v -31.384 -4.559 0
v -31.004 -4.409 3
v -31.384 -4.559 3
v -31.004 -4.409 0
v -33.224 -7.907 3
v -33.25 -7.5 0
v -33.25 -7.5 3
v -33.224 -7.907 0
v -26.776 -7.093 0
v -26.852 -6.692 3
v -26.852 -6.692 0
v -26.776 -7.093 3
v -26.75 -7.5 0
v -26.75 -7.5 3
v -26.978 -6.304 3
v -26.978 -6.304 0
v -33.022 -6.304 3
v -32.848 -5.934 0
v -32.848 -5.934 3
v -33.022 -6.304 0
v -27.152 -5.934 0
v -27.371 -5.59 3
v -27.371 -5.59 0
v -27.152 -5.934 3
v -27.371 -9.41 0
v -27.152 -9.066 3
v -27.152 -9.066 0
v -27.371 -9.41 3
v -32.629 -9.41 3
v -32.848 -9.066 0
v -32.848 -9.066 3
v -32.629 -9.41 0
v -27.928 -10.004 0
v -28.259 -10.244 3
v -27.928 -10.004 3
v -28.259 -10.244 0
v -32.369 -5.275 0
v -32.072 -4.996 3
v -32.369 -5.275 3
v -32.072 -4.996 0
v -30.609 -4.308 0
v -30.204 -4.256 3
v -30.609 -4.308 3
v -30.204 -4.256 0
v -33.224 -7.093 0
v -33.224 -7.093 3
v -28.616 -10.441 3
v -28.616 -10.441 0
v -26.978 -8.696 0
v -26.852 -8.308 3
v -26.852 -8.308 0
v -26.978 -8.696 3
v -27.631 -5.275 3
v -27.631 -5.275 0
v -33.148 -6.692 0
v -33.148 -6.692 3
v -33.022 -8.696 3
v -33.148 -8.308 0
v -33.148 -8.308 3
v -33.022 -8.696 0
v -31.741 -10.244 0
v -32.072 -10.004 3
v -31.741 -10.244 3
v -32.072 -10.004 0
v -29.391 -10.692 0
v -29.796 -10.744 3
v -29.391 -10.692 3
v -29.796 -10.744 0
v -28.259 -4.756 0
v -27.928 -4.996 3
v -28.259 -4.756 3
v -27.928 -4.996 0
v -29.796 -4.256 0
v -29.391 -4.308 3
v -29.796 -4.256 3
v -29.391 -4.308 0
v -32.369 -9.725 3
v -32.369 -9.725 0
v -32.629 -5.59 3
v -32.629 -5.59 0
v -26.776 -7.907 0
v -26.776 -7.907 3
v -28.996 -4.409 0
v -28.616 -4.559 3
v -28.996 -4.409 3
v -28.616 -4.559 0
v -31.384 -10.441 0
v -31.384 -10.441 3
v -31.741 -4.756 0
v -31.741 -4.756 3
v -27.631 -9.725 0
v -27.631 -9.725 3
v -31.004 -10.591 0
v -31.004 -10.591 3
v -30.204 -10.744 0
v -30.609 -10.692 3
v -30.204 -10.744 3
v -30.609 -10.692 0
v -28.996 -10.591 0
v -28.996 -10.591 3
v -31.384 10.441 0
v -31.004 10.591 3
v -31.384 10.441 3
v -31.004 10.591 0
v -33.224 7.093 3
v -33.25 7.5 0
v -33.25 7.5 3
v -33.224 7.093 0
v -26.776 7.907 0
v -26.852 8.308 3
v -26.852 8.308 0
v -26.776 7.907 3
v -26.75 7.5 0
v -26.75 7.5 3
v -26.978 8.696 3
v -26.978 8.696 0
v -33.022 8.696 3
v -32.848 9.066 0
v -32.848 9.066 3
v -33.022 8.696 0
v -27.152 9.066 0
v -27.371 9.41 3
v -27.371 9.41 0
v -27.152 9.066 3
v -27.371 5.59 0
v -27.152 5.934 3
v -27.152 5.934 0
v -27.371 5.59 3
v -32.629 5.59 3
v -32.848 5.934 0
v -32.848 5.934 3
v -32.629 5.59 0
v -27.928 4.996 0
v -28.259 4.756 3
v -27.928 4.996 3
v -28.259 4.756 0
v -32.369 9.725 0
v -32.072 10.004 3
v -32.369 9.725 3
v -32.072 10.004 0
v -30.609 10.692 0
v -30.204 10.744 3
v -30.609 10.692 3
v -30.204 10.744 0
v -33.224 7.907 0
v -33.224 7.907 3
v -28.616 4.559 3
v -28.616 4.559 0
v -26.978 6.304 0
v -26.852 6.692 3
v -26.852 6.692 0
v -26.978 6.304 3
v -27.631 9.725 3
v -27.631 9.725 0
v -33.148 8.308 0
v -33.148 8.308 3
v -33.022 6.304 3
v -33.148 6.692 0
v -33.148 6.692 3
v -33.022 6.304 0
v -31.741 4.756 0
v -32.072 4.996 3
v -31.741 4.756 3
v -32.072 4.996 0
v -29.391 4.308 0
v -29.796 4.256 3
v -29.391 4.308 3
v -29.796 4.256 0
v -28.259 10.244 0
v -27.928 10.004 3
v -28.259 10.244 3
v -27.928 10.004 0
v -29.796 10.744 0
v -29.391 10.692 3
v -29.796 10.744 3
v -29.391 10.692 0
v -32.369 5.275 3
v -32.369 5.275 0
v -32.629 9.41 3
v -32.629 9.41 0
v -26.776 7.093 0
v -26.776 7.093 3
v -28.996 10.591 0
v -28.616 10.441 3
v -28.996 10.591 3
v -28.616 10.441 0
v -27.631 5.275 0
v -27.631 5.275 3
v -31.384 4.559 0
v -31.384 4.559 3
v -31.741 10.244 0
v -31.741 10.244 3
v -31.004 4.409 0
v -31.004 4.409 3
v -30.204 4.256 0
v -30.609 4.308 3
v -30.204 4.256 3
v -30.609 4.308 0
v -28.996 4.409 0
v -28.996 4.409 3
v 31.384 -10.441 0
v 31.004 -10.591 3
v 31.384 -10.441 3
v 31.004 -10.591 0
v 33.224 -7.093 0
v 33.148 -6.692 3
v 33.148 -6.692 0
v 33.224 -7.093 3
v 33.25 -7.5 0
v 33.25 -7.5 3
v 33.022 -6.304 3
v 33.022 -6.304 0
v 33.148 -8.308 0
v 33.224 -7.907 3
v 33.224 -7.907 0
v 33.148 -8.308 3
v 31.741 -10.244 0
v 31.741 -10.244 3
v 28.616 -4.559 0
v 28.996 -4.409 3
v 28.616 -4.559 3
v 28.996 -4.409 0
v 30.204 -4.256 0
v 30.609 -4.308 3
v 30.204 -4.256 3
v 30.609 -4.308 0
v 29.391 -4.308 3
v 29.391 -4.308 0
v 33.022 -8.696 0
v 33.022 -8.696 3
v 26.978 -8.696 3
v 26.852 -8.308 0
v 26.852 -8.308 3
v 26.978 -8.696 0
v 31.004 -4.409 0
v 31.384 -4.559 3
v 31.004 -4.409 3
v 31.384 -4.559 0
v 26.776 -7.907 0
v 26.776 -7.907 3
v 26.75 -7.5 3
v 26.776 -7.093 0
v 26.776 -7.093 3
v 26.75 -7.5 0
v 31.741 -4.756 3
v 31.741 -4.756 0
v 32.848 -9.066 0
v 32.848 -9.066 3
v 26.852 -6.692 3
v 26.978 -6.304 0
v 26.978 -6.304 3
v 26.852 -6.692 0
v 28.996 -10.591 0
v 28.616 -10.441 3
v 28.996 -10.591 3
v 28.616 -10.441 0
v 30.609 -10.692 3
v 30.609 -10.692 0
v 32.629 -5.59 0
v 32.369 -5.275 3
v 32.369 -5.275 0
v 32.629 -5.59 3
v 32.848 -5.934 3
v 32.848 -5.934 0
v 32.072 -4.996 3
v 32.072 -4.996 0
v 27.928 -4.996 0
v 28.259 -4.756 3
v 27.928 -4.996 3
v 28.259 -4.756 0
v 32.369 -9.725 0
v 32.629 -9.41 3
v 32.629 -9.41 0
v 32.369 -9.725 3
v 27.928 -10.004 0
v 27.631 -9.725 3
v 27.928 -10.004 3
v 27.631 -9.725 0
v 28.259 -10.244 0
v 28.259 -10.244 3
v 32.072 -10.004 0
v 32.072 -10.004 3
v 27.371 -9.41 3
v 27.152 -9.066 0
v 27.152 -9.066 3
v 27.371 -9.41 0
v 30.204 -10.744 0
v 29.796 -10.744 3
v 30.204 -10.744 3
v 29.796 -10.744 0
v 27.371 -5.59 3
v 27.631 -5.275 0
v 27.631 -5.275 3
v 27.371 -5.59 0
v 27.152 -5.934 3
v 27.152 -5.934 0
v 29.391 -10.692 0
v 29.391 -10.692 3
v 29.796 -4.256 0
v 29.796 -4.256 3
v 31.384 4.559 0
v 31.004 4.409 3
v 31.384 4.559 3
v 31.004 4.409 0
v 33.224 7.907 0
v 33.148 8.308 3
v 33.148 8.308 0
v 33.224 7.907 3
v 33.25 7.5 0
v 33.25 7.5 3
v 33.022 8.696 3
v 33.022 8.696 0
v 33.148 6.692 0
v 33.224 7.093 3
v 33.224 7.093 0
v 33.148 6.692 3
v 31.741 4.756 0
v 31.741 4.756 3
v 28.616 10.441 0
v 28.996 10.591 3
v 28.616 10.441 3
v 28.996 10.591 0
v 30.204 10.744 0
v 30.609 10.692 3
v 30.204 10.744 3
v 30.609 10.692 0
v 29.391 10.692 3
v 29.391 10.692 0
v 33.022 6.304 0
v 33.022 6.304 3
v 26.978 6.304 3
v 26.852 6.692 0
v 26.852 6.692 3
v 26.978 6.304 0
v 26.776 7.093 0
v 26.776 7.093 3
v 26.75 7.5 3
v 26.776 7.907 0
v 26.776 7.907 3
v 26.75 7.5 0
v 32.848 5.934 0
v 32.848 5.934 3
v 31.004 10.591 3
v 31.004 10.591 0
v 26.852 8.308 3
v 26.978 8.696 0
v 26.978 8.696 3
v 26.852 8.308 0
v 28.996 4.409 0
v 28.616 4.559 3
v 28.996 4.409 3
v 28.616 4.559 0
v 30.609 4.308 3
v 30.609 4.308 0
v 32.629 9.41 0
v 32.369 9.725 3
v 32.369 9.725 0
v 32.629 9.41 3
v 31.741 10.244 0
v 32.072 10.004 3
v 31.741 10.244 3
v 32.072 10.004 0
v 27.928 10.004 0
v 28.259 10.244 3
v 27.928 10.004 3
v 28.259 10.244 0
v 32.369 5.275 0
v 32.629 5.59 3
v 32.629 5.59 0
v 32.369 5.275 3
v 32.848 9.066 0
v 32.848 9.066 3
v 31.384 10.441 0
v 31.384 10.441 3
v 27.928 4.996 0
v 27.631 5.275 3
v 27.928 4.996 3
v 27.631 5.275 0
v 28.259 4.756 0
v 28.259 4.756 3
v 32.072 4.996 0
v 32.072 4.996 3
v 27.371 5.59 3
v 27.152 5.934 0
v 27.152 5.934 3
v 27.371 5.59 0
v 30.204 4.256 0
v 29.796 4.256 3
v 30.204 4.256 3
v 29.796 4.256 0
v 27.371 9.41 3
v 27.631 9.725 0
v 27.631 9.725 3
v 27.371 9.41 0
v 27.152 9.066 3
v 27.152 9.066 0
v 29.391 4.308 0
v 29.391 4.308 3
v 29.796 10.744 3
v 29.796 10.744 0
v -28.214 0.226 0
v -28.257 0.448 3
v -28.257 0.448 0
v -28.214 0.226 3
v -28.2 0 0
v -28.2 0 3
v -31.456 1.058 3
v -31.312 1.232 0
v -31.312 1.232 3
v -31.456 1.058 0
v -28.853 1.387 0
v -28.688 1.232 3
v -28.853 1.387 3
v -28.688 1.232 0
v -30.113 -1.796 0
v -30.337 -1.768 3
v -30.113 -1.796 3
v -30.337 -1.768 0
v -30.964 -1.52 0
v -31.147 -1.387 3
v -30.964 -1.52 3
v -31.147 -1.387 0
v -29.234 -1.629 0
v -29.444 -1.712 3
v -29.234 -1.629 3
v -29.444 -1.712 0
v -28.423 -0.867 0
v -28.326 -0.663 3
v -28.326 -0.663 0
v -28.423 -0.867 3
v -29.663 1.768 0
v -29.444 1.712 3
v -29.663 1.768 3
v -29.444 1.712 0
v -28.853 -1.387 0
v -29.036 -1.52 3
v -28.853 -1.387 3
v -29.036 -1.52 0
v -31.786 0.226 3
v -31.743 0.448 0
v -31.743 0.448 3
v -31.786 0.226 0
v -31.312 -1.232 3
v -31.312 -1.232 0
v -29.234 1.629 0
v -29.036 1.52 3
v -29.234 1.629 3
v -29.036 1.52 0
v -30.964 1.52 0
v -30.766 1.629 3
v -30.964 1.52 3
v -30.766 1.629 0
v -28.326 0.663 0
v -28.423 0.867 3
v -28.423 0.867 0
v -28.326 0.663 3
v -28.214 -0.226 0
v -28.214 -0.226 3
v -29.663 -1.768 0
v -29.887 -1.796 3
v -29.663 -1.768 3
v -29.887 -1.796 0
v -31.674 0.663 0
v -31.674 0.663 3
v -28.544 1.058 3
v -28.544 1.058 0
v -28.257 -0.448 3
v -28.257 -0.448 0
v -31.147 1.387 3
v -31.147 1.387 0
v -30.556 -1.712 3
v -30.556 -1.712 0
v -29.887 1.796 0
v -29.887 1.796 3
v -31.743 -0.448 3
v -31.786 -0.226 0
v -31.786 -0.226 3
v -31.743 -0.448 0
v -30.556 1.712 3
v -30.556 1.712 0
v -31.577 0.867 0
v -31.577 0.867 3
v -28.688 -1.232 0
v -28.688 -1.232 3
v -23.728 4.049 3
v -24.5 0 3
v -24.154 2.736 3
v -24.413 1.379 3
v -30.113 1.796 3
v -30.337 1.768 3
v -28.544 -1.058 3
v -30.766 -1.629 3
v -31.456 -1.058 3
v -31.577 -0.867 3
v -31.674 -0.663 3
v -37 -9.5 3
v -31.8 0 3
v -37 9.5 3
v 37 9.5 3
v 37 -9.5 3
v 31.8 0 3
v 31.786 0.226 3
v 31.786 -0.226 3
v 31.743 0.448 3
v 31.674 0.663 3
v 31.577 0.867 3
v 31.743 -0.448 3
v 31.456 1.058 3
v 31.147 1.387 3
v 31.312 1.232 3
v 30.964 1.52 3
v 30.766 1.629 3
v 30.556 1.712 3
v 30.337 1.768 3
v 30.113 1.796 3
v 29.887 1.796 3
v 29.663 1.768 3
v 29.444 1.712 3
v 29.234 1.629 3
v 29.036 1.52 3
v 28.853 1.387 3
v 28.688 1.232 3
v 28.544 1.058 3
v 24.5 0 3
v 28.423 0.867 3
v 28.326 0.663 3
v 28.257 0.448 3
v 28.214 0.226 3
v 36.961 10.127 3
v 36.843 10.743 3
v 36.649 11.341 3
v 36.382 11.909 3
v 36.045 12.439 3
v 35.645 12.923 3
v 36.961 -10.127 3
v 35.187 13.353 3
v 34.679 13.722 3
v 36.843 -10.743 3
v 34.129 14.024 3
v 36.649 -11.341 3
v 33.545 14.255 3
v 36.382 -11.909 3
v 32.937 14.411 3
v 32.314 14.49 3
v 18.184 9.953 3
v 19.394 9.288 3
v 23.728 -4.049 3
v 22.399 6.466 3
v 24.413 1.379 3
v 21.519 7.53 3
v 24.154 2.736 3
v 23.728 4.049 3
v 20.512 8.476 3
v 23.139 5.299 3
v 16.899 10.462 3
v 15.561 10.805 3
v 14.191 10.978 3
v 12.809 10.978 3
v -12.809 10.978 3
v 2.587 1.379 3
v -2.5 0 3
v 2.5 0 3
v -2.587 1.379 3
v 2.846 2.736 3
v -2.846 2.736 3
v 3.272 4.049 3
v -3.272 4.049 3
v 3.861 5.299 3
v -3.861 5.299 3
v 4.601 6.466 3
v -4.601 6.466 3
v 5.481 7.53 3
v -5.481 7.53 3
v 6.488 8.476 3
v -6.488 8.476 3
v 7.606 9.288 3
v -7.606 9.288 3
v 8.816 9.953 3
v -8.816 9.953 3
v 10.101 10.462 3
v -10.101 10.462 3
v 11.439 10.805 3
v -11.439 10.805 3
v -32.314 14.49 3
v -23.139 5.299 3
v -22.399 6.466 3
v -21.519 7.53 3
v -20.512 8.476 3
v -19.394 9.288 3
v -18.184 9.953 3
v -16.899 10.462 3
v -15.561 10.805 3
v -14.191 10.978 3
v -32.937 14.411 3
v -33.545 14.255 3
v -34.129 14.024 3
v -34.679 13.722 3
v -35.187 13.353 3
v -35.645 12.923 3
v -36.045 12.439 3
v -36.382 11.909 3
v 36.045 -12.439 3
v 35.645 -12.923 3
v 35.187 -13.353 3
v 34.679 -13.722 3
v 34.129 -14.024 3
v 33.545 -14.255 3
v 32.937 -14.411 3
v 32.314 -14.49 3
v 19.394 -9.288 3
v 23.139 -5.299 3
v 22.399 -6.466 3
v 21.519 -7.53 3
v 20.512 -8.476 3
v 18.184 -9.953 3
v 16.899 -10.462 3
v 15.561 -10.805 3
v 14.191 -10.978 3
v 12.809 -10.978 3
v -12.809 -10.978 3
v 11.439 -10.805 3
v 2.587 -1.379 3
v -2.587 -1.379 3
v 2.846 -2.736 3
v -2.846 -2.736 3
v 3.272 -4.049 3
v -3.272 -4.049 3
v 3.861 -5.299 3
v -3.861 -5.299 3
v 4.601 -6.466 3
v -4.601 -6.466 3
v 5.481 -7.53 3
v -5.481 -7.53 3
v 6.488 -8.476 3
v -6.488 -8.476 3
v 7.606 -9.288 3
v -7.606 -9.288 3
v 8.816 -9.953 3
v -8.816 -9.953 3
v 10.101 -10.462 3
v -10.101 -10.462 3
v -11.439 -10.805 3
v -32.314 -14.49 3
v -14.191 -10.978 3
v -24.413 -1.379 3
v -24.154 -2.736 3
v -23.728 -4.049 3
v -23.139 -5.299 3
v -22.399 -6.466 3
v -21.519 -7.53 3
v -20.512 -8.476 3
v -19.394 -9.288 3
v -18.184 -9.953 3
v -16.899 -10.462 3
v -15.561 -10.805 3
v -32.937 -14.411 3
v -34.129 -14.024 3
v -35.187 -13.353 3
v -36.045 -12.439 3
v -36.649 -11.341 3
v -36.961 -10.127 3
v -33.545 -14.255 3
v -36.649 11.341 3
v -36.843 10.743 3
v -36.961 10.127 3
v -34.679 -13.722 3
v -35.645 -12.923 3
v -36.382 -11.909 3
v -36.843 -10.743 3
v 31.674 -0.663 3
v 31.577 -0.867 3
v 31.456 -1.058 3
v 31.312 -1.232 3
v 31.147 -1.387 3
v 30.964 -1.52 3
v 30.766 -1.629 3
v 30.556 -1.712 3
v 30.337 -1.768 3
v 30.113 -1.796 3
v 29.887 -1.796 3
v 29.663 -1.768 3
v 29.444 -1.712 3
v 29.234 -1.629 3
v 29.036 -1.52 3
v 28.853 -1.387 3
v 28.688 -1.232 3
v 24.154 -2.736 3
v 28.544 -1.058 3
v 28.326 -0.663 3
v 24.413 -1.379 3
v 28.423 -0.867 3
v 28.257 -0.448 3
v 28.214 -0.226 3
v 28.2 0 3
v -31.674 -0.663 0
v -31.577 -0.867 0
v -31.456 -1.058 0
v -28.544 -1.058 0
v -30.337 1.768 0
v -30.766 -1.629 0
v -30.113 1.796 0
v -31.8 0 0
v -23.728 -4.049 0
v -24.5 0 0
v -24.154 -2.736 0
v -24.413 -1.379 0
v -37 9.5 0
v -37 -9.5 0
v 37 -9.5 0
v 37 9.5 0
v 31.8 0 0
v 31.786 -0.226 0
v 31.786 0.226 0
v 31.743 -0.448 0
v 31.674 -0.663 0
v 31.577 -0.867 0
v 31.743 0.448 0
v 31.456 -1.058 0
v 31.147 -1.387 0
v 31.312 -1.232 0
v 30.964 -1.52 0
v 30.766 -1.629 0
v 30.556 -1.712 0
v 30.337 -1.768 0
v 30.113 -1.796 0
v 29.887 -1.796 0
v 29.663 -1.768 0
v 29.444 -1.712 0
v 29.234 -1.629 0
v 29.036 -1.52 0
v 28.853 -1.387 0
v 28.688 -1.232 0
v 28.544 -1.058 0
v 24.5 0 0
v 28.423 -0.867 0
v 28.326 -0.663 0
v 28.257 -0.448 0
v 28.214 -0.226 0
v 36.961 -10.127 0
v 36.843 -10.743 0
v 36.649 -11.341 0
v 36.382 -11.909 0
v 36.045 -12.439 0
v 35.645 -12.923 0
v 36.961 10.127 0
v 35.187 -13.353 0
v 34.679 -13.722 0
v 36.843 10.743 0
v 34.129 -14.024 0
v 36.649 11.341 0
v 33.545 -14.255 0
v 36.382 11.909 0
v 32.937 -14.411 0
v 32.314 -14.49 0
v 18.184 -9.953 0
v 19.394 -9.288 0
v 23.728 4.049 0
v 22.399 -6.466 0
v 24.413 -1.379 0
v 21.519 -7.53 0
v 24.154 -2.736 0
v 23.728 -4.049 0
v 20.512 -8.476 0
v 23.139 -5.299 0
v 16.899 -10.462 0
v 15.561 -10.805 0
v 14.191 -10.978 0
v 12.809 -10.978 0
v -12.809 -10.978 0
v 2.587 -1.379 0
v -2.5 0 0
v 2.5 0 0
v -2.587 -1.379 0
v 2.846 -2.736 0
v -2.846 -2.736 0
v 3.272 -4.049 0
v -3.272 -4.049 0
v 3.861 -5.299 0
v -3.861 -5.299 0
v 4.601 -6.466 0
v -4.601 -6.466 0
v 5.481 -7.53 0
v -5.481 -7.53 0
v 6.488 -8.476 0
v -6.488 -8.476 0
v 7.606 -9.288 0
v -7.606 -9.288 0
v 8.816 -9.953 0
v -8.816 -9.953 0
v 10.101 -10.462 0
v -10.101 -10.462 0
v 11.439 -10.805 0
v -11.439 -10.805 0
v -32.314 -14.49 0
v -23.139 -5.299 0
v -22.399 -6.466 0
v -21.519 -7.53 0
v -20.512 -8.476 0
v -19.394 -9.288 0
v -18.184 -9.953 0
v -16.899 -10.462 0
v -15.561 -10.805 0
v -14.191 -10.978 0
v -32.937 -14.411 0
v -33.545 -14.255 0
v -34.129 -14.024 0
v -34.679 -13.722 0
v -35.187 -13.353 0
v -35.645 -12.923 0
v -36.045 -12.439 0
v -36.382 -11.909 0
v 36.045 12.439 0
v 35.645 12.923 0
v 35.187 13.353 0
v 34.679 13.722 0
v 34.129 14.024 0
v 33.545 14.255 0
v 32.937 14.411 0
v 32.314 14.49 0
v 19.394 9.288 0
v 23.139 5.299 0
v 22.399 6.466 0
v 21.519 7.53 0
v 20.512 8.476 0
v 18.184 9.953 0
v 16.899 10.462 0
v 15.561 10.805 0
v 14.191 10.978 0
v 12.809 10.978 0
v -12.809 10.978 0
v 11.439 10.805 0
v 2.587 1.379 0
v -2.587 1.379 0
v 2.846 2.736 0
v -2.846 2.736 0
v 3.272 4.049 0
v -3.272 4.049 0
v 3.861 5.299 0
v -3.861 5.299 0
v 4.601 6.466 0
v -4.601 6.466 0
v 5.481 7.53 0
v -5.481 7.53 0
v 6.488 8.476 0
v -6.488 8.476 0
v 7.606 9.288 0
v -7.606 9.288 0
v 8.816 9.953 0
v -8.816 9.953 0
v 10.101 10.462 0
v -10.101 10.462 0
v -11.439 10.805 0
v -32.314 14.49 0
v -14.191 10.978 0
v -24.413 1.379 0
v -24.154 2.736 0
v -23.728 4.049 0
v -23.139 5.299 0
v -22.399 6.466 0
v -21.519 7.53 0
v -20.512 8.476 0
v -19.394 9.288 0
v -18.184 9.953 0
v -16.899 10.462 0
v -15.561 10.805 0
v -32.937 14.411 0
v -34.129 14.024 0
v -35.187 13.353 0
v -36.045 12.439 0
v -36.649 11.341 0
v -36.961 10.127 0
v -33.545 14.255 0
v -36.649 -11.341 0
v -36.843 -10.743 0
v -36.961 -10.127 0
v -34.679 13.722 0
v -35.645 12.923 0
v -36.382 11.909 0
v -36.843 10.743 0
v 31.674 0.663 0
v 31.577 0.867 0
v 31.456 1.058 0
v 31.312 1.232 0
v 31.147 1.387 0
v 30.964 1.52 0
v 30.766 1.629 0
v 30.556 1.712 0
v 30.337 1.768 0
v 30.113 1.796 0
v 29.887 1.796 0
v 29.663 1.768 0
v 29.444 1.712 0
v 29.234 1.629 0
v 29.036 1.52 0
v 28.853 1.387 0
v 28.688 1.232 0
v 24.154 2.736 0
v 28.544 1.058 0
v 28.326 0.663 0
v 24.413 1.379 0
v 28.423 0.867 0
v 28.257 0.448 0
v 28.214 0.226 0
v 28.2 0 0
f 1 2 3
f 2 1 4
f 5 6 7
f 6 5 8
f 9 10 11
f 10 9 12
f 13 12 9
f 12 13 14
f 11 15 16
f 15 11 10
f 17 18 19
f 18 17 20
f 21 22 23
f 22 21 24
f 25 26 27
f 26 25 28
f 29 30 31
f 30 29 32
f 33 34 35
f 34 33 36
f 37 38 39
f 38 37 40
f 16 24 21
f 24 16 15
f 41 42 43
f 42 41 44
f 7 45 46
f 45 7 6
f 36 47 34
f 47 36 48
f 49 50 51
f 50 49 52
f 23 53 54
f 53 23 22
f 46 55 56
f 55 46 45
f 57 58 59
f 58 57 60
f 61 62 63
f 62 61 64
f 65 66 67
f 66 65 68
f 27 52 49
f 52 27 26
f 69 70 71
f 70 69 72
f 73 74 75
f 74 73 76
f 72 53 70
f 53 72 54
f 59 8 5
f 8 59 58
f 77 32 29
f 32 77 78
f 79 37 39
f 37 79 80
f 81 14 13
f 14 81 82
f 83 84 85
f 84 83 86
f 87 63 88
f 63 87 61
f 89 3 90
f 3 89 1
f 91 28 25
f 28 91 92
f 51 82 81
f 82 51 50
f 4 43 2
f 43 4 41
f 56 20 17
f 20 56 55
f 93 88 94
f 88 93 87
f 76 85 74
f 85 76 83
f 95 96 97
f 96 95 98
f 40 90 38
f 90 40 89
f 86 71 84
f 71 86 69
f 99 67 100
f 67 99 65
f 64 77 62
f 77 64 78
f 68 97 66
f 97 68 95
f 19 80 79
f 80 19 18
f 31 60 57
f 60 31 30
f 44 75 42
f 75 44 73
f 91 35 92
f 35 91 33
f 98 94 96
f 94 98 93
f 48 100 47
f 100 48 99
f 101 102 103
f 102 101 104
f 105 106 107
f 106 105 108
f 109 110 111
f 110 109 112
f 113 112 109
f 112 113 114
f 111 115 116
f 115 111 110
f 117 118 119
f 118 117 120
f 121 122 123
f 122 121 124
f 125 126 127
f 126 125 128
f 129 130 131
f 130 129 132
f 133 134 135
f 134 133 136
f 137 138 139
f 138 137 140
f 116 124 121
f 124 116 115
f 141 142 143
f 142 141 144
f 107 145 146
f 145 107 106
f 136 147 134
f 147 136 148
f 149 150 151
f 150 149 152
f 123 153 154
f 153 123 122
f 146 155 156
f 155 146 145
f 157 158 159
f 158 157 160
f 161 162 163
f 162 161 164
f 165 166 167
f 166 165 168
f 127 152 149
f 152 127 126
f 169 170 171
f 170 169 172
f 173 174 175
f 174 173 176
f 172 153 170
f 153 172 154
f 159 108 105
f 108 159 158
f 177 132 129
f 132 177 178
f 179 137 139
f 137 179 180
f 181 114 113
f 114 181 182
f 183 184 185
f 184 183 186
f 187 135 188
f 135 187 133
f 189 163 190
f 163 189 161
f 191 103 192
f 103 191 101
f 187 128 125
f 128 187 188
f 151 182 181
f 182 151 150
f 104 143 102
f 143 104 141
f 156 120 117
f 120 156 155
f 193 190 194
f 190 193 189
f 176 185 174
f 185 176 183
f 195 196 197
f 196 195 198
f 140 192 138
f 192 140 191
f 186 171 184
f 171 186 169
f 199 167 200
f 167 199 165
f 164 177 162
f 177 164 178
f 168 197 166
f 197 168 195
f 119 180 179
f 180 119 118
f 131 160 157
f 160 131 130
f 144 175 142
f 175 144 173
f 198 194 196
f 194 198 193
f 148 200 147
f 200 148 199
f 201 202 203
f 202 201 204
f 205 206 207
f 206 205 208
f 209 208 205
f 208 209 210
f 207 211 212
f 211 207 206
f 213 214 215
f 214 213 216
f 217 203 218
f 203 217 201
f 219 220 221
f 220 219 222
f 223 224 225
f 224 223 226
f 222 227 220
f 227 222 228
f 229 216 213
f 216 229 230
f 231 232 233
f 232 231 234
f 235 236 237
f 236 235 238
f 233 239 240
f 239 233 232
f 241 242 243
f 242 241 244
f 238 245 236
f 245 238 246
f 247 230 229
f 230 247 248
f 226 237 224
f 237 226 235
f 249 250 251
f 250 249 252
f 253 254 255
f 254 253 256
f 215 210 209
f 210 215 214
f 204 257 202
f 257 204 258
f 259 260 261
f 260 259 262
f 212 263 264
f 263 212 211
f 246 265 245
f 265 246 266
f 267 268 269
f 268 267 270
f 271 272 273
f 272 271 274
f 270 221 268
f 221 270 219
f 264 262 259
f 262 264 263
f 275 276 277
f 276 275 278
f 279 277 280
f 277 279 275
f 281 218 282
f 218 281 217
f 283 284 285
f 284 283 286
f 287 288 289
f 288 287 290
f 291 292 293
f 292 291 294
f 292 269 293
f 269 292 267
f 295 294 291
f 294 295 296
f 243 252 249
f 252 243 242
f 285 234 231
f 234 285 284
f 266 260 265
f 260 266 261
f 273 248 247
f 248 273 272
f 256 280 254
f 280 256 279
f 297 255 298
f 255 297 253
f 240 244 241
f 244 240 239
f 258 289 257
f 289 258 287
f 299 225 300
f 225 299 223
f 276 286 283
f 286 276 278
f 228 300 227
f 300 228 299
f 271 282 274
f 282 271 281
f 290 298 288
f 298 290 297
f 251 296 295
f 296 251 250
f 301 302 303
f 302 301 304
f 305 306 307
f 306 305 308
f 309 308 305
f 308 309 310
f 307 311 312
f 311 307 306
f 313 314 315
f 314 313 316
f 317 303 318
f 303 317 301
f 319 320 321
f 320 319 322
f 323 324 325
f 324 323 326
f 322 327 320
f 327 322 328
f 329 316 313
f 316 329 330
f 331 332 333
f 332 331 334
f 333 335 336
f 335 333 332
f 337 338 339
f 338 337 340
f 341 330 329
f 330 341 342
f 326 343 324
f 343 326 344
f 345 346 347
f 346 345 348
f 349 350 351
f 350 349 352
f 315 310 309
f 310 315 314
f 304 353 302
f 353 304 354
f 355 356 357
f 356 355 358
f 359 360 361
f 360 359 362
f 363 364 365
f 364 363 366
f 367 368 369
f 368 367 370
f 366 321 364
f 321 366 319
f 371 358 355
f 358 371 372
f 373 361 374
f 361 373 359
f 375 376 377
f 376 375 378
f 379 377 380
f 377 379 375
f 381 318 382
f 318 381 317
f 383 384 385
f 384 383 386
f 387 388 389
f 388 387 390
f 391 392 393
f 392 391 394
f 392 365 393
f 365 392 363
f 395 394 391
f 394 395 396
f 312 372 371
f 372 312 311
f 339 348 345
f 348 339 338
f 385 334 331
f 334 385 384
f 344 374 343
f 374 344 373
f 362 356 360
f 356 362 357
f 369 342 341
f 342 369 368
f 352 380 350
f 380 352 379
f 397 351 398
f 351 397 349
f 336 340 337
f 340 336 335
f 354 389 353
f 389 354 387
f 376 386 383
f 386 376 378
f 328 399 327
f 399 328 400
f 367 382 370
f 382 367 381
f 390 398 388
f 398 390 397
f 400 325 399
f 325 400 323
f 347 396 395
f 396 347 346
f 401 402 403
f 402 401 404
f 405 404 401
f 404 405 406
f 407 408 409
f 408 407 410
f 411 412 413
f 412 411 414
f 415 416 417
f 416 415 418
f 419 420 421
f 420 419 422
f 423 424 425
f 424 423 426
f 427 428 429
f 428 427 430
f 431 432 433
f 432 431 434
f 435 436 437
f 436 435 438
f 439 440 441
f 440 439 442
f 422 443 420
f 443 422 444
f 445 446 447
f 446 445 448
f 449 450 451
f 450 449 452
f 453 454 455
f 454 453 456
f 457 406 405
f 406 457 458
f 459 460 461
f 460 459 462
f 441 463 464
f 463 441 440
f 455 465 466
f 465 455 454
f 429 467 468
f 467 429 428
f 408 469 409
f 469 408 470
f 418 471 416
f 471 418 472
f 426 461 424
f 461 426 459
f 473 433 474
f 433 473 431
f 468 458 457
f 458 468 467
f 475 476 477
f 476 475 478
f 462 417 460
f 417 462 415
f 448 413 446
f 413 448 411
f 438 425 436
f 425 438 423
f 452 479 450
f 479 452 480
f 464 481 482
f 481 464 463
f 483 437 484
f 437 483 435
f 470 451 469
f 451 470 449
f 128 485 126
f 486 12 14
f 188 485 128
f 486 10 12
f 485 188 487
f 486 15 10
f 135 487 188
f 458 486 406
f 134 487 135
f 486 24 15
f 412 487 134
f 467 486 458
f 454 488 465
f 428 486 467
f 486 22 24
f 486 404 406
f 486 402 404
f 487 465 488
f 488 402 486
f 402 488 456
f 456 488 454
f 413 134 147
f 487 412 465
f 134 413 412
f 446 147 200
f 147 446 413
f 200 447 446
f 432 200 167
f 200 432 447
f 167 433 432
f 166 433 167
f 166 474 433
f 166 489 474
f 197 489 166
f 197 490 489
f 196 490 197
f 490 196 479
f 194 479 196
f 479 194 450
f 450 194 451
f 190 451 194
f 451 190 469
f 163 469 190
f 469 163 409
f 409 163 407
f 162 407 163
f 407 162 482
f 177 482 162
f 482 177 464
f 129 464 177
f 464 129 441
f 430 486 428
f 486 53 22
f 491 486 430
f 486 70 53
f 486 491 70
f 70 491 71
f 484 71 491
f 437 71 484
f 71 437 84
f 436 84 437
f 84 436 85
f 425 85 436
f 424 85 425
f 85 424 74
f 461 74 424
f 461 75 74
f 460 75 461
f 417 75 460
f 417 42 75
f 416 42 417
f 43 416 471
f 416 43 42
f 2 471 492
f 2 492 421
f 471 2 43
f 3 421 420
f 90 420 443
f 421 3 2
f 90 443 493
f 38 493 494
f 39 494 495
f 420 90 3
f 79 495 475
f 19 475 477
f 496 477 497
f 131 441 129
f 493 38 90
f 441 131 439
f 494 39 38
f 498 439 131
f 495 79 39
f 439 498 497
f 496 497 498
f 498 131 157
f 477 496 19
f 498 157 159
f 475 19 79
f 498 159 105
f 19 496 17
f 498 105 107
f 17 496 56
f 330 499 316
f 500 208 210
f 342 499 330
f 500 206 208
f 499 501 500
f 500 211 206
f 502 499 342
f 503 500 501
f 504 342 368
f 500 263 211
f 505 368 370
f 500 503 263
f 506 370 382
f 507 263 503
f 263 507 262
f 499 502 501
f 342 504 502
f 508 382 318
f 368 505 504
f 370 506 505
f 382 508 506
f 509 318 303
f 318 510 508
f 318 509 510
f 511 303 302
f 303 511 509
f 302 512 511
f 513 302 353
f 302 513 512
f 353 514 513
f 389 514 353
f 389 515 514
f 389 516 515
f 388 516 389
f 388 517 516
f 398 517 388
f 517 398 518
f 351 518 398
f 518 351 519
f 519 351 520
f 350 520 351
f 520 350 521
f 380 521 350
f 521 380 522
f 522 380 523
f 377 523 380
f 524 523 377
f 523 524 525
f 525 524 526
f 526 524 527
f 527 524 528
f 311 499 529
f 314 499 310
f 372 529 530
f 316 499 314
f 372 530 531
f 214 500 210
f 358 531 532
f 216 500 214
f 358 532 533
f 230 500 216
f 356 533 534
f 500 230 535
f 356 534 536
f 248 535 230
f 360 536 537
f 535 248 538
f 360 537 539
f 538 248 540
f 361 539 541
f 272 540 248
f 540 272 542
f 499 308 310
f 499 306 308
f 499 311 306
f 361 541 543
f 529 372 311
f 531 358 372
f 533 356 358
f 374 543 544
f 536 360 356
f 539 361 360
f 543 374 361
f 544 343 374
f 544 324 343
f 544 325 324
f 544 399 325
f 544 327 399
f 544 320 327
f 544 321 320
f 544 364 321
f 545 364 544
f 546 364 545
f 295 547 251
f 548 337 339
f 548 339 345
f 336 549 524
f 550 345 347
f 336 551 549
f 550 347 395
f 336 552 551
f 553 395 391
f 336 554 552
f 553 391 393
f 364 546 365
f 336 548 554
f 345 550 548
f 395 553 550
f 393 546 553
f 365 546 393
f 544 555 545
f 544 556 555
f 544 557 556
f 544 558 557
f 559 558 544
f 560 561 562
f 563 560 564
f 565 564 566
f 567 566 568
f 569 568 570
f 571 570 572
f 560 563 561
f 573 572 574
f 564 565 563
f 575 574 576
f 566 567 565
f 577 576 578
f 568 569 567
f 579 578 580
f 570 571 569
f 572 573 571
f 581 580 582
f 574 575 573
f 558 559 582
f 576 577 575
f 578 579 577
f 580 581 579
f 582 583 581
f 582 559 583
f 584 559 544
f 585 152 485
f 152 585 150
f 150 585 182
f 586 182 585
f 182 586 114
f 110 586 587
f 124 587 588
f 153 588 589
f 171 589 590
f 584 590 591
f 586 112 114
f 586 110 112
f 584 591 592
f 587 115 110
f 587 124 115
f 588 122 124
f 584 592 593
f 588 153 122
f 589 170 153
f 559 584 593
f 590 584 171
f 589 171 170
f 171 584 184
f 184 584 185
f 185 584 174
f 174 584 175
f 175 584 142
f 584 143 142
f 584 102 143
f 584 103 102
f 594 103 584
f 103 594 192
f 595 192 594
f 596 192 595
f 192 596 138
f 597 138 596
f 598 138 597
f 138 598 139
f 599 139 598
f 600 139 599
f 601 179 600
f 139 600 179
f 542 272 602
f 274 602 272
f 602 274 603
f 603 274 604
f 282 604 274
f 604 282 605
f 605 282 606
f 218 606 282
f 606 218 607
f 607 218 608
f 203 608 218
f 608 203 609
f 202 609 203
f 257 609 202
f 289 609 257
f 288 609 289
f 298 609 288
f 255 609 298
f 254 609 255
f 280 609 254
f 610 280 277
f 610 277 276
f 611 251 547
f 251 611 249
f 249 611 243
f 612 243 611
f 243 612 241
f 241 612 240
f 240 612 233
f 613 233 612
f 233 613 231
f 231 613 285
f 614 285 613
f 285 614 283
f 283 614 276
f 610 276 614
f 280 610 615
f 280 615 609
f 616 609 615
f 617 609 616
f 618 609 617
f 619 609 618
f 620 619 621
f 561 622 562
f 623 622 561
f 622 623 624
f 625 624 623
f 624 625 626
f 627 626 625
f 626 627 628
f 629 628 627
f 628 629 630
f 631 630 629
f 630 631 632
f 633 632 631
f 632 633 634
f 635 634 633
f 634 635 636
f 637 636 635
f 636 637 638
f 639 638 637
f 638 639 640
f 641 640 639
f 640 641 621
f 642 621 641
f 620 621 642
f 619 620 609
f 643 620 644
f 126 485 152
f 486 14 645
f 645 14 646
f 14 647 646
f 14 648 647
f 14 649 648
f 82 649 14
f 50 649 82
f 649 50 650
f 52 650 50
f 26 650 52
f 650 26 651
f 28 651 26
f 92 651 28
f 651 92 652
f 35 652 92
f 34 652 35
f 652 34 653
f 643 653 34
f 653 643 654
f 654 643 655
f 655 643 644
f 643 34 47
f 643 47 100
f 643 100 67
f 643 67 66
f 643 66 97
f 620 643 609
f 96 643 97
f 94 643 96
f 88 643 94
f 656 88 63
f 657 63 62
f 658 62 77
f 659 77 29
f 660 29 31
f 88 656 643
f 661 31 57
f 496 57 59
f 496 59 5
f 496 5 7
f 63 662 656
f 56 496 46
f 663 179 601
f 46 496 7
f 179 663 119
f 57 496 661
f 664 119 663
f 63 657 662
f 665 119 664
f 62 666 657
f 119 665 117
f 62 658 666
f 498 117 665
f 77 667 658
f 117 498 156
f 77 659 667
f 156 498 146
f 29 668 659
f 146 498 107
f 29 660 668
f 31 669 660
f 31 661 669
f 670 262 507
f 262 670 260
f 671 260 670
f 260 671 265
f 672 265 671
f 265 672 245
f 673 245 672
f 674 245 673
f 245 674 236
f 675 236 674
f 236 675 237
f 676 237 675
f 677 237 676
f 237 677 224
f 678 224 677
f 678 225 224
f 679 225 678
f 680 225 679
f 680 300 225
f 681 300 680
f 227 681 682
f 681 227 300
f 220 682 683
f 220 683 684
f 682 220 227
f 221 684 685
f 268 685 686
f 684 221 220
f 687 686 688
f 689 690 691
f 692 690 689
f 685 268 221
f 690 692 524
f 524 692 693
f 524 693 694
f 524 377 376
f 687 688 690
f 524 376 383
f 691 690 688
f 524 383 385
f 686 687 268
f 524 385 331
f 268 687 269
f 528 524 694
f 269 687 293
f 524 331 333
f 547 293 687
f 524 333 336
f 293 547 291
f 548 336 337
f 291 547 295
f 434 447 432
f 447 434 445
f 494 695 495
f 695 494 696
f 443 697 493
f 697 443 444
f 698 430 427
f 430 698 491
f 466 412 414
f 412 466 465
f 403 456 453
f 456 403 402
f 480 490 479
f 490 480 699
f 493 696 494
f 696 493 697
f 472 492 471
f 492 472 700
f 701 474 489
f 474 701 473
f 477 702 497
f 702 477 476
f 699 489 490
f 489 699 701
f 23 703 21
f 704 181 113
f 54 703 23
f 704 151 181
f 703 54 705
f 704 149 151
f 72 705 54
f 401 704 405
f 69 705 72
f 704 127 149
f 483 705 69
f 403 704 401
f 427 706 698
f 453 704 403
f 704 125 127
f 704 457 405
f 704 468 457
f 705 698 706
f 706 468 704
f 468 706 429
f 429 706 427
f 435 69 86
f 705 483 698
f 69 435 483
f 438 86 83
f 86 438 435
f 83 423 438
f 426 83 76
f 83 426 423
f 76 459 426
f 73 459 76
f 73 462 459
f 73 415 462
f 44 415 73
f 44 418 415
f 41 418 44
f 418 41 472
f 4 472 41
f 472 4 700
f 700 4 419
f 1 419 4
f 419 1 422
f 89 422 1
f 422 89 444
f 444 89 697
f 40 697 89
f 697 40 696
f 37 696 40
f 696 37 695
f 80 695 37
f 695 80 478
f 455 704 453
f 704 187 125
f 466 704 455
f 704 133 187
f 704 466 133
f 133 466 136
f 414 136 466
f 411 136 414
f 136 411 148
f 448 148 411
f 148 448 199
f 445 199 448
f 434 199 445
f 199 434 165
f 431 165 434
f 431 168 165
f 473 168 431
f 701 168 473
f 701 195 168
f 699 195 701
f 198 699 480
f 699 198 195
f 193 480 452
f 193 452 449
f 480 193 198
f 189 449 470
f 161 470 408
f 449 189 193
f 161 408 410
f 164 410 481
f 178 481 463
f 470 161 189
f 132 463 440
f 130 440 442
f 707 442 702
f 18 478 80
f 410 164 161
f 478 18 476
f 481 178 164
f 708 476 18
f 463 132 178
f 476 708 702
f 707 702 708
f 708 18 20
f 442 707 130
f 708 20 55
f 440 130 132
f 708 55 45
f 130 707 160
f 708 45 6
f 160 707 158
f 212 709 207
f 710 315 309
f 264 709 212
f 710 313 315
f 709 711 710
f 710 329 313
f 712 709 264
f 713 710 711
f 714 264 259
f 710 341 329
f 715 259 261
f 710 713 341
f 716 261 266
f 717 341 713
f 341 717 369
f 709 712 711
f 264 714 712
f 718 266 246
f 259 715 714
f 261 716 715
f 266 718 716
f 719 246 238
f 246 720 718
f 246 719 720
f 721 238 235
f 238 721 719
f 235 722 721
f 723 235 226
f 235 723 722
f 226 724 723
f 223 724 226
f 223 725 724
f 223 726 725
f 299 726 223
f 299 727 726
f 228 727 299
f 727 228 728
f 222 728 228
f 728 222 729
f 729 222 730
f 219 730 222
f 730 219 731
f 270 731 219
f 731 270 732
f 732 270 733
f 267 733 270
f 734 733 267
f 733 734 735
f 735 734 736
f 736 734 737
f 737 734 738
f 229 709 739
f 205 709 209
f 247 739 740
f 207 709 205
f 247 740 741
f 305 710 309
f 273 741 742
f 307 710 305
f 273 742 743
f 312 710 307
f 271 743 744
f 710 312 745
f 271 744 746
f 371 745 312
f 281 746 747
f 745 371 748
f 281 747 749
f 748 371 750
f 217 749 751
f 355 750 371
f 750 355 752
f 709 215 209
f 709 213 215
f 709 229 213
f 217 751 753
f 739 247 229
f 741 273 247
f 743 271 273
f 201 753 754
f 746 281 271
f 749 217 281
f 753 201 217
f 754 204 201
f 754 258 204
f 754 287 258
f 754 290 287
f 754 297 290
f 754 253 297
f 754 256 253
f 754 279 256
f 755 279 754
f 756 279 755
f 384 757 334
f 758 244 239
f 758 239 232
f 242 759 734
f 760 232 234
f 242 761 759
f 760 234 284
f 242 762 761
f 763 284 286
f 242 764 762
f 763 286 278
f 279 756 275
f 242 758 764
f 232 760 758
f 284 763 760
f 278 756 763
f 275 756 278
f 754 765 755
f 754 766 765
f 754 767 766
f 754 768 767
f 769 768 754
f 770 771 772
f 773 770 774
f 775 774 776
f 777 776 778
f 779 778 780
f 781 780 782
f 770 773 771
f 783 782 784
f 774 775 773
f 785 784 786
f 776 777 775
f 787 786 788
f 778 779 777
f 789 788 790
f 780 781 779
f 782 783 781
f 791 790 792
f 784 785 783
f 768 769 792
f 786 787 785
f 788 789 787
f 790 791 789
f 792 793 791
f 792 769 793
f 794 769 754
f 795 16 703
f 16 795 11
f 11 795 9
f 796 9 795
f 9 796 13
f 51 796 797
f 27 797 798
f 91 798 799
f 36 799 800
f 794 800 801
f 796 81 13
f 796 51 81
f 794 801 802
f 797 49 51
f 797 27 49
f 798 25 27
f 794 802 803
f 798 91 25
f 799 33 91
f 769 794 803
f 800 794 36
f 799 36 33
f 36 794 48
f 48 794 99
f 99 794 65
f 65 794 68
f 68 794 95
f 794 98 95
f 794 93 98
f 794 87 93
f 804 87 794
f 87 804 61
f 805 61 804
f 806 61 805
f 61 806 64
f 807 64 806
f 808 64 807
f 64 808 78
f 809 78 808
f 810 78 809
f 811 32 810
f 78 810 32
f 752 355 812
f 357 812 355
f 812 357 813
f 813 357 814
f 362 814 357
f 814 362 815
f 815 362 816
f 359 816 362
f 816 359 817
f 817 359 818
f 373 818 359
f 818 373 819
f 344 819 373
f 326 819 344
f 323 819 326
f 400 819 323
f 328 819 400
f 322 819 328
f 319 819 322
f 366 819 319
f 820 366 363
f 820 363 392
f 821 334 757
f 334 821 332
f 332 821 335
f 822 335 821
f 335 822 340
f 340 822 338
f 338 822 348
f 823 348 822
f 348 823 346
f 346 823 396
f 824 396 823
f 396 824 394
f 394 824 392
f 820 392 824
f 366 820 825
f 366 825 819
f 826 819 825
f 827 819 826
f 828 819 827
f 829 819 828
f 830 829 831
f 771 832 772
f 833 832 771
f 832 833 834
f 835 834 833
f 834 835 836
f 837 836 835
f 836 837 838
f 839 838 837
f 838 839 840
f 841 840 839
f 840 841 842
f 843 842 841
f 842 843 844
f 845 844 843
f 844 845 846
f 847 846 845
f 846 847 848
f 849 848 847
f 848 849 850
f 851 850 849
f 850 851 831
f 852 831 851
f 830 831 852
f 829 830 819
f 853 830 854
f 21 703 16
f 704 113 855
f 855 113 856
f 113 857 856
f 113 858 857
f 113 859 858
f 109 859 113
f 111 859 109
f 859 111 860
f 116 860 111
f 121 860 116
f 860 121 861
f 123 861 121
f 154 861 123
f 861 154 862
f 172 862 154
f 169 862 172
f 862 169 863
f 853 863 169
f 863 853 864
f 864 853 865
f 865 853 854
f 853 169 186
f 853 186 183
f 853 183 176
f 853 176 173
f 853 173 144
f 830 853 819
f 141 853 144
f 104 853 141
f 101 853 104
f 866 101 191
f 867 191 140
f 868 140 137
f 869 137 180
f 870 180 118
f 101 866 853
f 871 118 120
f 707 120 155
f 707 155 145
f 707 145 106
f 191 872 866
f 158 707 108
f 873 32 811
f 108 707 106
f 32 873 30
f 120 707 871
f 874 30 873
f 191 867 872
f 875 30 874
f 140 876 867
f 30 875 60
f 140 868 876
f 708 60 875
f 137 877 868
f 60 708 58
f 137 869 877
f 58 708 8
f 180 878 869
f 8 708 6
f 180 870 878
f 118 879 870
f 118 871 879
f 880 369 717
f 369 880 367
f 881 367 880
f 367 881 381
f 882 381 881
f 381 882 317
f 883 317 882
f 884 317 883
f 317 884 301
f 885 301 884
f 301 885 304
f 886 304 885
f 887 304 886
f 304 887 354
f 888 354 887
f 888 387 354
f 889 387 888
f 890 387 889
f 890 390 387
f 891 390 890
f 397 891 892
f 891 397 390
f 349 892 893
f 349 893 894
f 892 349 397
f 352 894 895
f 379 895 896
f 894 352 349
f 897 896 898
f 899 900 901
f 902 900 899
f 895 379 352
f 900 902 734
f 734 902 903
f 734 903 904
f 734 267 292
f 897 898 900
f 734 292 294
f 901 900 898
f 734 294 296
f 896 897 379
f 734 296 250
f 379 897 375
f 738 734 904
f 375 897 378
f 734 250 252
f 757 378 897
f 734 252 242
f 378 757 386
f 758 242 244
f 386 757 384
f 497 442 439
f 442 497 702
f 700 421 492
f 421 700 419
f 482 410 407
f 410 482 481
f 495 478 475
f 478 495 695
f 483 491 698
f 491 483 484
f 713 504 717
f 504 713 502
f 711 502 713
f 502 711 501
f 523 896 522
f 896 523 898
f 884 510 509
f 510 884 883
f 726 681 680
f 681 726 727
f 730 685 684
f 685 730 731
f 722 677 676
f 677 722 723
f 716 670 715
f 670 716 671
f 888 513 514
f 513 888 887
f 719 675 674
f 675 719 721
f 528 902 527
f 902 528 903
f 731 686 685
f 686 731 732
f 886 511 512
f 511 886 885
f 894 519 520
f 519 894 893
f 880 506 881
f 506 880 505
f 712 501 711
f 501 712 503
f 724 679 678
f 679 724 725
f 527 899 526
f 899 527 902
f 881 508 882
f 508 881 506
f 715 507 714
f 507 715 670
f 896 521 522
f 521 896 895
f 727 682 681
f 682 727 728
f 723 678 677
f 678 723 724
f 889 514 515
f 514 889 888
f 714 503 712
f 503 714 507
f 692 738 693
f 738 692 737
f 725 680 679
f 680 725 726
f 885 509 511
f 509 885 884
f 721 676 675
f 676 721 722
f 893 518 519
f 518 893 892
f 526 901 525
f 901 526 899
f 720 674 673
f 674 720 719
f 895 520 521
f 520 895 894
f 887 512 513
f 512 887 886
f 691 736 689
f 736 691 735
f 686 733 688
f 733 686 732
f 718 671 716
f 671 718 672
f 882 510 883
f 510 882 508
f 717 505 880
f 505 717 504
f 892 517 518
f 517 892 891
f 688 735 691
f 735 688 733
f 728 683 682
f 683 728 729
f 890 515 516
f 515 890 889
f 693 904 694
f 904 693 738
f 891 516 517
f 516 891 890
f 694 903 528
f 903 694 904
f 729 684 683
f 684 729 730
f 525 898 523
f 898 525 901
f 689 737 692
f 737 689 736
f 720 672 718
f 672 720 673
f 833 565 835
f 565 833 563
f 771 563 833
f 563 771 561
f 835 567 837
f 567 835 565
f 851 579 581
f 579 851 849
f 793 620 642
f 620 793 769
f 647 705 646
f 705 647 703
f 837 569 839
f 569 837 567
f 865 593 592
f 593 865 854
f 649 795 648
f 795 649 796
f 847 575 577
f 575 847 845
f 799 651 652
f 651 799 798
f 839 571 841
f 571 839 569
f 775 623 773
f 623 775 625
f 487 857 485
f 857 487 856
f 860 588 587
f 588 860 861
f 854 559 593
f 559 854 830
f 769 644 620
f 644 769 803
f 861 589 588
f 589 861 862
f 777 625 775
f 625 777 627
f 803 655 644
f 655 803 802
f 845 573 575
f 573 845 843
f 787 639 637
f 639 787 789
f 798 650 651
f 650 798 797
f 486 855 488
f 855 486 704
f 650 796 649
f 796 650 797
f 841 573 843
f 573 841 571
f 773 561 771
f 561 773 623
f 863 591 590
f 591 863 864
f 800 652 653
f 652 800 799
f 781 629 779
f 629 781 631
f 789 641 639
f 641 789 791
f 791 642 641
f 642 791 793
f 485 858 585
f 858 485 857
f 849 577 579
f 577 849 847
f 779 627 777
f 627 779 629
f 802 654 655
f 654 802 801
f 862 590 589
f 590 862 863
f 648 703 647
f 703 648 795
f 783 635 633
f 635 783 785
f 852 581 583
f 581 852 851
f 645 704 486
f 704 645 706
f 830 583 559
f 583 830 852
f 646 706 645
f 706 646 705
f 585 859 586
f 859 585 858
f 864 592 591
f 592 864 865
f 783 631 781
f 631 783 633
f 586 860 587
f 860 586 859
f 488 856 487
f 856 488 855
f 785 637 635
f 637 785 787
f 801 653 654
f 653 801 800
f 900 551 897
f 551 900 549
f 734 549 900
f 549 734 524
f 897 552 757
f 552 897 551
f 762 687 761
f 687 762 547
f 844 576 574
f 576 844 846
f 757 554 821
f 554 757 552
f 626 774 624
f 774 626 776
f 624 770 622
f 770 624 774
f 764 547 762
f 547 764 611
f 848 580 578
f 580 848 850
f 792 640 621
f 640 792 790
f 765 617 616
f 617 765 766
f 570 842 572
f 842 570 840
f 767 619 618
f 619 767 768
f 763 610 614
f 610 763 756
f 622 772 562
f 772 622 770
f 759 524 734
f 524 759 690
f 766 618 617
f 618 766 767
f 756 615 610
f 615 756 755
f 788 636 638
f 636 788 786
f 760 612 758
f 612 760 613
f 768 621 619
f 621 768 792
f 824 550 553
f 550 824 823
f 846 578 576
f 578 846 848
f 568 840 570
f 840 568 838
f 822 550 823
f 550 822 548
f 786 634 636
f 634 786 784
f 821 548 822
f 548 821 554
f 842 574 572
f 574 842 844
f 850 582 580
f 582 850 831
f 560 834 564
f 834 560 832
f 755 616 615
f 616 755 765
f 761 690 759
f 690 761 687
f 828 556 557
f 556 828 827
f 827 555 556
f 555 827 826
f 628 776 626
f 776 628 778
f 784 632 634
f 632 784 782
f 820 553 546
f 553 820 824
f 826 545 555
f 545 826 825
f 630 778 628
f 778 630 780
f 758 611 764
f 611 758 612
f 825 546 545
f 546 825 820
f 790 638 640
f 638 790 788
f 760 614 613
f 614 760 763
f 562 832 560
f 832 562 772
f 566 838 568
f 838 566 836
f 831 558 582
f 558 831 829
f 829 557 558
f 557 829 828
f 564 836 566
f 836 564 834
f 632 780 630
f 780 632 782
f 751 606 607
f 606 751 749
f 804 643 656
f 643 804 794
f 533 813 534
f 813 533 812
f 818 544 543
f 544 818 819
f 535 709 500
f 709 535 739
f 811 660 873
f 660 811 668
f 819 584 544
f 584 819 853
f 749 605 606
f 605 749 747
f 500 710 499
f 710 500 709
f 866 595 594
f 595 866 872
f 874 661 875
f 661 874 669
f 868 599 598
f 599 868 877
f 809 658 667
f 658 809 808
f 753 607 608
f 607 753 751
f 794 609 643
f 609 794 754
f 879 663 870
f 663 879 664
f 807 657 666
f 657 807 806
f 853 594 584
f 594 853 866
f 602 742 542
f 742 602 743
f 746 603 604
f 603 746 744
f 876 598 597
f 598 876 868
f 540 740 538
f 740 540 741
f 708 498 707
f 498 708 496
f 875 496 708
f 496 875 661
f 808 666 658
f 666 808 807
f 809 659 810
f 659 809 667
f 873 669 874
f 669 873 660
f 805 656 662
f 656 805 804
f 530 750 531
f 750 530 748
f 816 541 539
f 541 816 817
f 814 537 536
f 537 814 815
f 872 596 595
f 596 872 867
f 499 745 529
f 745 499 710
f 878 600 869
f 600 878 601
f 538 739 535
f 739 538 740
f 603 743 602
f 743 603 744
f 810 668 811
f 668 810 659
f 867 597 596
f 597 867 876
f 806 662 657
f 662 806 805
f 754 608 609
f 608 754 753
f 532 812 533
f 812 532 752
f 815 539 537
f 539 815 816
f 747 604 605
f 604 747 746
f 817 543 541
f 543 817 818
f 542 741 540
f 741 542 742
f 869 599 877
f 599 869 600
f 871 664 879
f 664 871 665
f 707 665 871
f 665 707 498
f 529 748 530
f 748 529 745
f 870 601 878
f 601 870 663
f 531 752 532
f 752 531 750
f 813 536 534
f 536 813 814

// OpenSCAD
$fn = 50;


difference() {
	union() {
		hull() {
			translate(v = [-32.0000000000, 9.5000000000, 0]) {
				cylinder(h = 3, r = 5);
			}
			translate(v = [32.0000000000, 9.5000000000, 0]) {
				cylinder(h = 3, r = 5);
			}
			translate(v = [-32.0000000000, -9.5000000000, 0]) {
				cylinder(h = 3, r = 5);
			}
			translate(v = [32.0000000000, -9.5000000000, 0]) {
				cylinder(h = 3, r = 5);
			}
		}
	}
	union() {
		#translate(v = [-30.0000000000, -7.5000000000, 0]) {
			cylinder(h = 3, r = 3.2500000000);
		}
		#translate(v = [-30.0000000000, 7.5000000000, 0]) {
			cylinder(h = 3, r = 3.2500000000);
		}
		#translate(v = [30.0000000000, -7.5000000000, 0]) {
			cylinder(h = 3, r = 3.2500000000);
		}
		#translate(v = [30.0000000000, 7.5000000000, 0]) {
			cylinder(h = 3, r = 3.2500000000);
		}
		#translate(v = [-30.0000000000, -7.5000000000, -100.0000000000]) {
			cylinder(h = 200, r = 3.2500000000);
		}
		#translate(v = [-30.0000000000, 7.5000000000, -100.0000000000]) {
			cylinder(h = 200, r = 3.2500000000);
		}
		#translate(v = [30.0000000000, -7.5000000000, -100.0000000000]) {
			cylinder(h = 200, r = 3.2500000000);
		}
		#translate(v = [30.0000000000, 7.5000000000, -100.0000000000]) {
			cylinder(h = 200, r = 3.2500000000);
		}
		#translate(v = [-30.0000000000, -7.5000000000, 0]) {
			cylinder(h = 3, r = 1.8000000000);
		}
		#translate(v = [-30.0000000000, 0.0000000000, 0]) {
			cylinder(h = 3, r = 1.8000000000);
		}
		#translate(v = [-30.0000000000, 7.5000000000, 0]) {
			cylinder(h = 3, r = 1.8000000000);
		}
		#translate(v = [30.0000000000, -7.5000000000, 0]) {
			cylinder(h = 3, r = 1.8000000000);
		}
		#translate(v = [30.0000000000, 0.0000000000, 0]) {
			cylinder(h = 3, r = 1.8000000000);
		}
		#translate(v = [30.0000000000, 7.5000000000, 0]) {
			cylinder(h = 3, r = 1.8000000000);
		}
		#translate(v = [-30.0000000000, -7.5000000000, 0]) {
			cylinder(h = 3, r = 1.8000000000);
		}
		#translate(v = [-30.0000000000, 0.0000000000, 0]) {
			cylinder(h = 3, r = 1.8000000000);
		}
		#translate(v = [-30.0000000000, 7.5000000000, 0]) {
			cylinder(h = 3, r = 1.8000000000);
		}
		#translate(v = [30.0000000000, -7.5000000000, 0]) {
			cylinder(h = 3, r = 1.8000000000);
		}
		#translate(v = [30.0000000000, 0.0000000000, 0]) {
			cylinder(h = 3, r = 1.8000000000);
		}
		#translate(v = [30.0000000000, 7.5000000000, 0]) {
			cylinder(h = 3, r = 1.8000000000);
		}
		#translate(v = [-30.0000000000, -7.5000000000, 0]) {
			cylinder(h = 3, r = 1.8000000000);
		}
		#translate(v = [-30.0000000000, 0.0000000000, 0]) {
			cylinder(h = 3, r = 1.8000000000);
		}
		#translate(v = [-30.0000000000, 7.5000000000, 0]) {
			cylinder(h = 3, r = 1.8000000000);
		}
		#translate(v = [30.0000000000, -7.5000000000, 0]) {
			cylinder(h = 3, r = 1.8000000000);
		}
		#translate(v = [30.0000000000, 0.0000000000, 0]) {
			cylinder(h = 3, r = 1.8000000000);
		}
		#translate(v = [30.0000000000, 7.5000000000, 0]) {
			cylinder(h = 3, r = 1.8000000000);
		}
		#translate(v = [-13.5000000000, 0, 0]) {
			cylinder(h = 3, r = 11.0000000000);
		}
		#translate(v = [13.5000000000, 0, 0]) {
			cylinder(h = 3, r = 11.0000000000);
		}
	}
}
